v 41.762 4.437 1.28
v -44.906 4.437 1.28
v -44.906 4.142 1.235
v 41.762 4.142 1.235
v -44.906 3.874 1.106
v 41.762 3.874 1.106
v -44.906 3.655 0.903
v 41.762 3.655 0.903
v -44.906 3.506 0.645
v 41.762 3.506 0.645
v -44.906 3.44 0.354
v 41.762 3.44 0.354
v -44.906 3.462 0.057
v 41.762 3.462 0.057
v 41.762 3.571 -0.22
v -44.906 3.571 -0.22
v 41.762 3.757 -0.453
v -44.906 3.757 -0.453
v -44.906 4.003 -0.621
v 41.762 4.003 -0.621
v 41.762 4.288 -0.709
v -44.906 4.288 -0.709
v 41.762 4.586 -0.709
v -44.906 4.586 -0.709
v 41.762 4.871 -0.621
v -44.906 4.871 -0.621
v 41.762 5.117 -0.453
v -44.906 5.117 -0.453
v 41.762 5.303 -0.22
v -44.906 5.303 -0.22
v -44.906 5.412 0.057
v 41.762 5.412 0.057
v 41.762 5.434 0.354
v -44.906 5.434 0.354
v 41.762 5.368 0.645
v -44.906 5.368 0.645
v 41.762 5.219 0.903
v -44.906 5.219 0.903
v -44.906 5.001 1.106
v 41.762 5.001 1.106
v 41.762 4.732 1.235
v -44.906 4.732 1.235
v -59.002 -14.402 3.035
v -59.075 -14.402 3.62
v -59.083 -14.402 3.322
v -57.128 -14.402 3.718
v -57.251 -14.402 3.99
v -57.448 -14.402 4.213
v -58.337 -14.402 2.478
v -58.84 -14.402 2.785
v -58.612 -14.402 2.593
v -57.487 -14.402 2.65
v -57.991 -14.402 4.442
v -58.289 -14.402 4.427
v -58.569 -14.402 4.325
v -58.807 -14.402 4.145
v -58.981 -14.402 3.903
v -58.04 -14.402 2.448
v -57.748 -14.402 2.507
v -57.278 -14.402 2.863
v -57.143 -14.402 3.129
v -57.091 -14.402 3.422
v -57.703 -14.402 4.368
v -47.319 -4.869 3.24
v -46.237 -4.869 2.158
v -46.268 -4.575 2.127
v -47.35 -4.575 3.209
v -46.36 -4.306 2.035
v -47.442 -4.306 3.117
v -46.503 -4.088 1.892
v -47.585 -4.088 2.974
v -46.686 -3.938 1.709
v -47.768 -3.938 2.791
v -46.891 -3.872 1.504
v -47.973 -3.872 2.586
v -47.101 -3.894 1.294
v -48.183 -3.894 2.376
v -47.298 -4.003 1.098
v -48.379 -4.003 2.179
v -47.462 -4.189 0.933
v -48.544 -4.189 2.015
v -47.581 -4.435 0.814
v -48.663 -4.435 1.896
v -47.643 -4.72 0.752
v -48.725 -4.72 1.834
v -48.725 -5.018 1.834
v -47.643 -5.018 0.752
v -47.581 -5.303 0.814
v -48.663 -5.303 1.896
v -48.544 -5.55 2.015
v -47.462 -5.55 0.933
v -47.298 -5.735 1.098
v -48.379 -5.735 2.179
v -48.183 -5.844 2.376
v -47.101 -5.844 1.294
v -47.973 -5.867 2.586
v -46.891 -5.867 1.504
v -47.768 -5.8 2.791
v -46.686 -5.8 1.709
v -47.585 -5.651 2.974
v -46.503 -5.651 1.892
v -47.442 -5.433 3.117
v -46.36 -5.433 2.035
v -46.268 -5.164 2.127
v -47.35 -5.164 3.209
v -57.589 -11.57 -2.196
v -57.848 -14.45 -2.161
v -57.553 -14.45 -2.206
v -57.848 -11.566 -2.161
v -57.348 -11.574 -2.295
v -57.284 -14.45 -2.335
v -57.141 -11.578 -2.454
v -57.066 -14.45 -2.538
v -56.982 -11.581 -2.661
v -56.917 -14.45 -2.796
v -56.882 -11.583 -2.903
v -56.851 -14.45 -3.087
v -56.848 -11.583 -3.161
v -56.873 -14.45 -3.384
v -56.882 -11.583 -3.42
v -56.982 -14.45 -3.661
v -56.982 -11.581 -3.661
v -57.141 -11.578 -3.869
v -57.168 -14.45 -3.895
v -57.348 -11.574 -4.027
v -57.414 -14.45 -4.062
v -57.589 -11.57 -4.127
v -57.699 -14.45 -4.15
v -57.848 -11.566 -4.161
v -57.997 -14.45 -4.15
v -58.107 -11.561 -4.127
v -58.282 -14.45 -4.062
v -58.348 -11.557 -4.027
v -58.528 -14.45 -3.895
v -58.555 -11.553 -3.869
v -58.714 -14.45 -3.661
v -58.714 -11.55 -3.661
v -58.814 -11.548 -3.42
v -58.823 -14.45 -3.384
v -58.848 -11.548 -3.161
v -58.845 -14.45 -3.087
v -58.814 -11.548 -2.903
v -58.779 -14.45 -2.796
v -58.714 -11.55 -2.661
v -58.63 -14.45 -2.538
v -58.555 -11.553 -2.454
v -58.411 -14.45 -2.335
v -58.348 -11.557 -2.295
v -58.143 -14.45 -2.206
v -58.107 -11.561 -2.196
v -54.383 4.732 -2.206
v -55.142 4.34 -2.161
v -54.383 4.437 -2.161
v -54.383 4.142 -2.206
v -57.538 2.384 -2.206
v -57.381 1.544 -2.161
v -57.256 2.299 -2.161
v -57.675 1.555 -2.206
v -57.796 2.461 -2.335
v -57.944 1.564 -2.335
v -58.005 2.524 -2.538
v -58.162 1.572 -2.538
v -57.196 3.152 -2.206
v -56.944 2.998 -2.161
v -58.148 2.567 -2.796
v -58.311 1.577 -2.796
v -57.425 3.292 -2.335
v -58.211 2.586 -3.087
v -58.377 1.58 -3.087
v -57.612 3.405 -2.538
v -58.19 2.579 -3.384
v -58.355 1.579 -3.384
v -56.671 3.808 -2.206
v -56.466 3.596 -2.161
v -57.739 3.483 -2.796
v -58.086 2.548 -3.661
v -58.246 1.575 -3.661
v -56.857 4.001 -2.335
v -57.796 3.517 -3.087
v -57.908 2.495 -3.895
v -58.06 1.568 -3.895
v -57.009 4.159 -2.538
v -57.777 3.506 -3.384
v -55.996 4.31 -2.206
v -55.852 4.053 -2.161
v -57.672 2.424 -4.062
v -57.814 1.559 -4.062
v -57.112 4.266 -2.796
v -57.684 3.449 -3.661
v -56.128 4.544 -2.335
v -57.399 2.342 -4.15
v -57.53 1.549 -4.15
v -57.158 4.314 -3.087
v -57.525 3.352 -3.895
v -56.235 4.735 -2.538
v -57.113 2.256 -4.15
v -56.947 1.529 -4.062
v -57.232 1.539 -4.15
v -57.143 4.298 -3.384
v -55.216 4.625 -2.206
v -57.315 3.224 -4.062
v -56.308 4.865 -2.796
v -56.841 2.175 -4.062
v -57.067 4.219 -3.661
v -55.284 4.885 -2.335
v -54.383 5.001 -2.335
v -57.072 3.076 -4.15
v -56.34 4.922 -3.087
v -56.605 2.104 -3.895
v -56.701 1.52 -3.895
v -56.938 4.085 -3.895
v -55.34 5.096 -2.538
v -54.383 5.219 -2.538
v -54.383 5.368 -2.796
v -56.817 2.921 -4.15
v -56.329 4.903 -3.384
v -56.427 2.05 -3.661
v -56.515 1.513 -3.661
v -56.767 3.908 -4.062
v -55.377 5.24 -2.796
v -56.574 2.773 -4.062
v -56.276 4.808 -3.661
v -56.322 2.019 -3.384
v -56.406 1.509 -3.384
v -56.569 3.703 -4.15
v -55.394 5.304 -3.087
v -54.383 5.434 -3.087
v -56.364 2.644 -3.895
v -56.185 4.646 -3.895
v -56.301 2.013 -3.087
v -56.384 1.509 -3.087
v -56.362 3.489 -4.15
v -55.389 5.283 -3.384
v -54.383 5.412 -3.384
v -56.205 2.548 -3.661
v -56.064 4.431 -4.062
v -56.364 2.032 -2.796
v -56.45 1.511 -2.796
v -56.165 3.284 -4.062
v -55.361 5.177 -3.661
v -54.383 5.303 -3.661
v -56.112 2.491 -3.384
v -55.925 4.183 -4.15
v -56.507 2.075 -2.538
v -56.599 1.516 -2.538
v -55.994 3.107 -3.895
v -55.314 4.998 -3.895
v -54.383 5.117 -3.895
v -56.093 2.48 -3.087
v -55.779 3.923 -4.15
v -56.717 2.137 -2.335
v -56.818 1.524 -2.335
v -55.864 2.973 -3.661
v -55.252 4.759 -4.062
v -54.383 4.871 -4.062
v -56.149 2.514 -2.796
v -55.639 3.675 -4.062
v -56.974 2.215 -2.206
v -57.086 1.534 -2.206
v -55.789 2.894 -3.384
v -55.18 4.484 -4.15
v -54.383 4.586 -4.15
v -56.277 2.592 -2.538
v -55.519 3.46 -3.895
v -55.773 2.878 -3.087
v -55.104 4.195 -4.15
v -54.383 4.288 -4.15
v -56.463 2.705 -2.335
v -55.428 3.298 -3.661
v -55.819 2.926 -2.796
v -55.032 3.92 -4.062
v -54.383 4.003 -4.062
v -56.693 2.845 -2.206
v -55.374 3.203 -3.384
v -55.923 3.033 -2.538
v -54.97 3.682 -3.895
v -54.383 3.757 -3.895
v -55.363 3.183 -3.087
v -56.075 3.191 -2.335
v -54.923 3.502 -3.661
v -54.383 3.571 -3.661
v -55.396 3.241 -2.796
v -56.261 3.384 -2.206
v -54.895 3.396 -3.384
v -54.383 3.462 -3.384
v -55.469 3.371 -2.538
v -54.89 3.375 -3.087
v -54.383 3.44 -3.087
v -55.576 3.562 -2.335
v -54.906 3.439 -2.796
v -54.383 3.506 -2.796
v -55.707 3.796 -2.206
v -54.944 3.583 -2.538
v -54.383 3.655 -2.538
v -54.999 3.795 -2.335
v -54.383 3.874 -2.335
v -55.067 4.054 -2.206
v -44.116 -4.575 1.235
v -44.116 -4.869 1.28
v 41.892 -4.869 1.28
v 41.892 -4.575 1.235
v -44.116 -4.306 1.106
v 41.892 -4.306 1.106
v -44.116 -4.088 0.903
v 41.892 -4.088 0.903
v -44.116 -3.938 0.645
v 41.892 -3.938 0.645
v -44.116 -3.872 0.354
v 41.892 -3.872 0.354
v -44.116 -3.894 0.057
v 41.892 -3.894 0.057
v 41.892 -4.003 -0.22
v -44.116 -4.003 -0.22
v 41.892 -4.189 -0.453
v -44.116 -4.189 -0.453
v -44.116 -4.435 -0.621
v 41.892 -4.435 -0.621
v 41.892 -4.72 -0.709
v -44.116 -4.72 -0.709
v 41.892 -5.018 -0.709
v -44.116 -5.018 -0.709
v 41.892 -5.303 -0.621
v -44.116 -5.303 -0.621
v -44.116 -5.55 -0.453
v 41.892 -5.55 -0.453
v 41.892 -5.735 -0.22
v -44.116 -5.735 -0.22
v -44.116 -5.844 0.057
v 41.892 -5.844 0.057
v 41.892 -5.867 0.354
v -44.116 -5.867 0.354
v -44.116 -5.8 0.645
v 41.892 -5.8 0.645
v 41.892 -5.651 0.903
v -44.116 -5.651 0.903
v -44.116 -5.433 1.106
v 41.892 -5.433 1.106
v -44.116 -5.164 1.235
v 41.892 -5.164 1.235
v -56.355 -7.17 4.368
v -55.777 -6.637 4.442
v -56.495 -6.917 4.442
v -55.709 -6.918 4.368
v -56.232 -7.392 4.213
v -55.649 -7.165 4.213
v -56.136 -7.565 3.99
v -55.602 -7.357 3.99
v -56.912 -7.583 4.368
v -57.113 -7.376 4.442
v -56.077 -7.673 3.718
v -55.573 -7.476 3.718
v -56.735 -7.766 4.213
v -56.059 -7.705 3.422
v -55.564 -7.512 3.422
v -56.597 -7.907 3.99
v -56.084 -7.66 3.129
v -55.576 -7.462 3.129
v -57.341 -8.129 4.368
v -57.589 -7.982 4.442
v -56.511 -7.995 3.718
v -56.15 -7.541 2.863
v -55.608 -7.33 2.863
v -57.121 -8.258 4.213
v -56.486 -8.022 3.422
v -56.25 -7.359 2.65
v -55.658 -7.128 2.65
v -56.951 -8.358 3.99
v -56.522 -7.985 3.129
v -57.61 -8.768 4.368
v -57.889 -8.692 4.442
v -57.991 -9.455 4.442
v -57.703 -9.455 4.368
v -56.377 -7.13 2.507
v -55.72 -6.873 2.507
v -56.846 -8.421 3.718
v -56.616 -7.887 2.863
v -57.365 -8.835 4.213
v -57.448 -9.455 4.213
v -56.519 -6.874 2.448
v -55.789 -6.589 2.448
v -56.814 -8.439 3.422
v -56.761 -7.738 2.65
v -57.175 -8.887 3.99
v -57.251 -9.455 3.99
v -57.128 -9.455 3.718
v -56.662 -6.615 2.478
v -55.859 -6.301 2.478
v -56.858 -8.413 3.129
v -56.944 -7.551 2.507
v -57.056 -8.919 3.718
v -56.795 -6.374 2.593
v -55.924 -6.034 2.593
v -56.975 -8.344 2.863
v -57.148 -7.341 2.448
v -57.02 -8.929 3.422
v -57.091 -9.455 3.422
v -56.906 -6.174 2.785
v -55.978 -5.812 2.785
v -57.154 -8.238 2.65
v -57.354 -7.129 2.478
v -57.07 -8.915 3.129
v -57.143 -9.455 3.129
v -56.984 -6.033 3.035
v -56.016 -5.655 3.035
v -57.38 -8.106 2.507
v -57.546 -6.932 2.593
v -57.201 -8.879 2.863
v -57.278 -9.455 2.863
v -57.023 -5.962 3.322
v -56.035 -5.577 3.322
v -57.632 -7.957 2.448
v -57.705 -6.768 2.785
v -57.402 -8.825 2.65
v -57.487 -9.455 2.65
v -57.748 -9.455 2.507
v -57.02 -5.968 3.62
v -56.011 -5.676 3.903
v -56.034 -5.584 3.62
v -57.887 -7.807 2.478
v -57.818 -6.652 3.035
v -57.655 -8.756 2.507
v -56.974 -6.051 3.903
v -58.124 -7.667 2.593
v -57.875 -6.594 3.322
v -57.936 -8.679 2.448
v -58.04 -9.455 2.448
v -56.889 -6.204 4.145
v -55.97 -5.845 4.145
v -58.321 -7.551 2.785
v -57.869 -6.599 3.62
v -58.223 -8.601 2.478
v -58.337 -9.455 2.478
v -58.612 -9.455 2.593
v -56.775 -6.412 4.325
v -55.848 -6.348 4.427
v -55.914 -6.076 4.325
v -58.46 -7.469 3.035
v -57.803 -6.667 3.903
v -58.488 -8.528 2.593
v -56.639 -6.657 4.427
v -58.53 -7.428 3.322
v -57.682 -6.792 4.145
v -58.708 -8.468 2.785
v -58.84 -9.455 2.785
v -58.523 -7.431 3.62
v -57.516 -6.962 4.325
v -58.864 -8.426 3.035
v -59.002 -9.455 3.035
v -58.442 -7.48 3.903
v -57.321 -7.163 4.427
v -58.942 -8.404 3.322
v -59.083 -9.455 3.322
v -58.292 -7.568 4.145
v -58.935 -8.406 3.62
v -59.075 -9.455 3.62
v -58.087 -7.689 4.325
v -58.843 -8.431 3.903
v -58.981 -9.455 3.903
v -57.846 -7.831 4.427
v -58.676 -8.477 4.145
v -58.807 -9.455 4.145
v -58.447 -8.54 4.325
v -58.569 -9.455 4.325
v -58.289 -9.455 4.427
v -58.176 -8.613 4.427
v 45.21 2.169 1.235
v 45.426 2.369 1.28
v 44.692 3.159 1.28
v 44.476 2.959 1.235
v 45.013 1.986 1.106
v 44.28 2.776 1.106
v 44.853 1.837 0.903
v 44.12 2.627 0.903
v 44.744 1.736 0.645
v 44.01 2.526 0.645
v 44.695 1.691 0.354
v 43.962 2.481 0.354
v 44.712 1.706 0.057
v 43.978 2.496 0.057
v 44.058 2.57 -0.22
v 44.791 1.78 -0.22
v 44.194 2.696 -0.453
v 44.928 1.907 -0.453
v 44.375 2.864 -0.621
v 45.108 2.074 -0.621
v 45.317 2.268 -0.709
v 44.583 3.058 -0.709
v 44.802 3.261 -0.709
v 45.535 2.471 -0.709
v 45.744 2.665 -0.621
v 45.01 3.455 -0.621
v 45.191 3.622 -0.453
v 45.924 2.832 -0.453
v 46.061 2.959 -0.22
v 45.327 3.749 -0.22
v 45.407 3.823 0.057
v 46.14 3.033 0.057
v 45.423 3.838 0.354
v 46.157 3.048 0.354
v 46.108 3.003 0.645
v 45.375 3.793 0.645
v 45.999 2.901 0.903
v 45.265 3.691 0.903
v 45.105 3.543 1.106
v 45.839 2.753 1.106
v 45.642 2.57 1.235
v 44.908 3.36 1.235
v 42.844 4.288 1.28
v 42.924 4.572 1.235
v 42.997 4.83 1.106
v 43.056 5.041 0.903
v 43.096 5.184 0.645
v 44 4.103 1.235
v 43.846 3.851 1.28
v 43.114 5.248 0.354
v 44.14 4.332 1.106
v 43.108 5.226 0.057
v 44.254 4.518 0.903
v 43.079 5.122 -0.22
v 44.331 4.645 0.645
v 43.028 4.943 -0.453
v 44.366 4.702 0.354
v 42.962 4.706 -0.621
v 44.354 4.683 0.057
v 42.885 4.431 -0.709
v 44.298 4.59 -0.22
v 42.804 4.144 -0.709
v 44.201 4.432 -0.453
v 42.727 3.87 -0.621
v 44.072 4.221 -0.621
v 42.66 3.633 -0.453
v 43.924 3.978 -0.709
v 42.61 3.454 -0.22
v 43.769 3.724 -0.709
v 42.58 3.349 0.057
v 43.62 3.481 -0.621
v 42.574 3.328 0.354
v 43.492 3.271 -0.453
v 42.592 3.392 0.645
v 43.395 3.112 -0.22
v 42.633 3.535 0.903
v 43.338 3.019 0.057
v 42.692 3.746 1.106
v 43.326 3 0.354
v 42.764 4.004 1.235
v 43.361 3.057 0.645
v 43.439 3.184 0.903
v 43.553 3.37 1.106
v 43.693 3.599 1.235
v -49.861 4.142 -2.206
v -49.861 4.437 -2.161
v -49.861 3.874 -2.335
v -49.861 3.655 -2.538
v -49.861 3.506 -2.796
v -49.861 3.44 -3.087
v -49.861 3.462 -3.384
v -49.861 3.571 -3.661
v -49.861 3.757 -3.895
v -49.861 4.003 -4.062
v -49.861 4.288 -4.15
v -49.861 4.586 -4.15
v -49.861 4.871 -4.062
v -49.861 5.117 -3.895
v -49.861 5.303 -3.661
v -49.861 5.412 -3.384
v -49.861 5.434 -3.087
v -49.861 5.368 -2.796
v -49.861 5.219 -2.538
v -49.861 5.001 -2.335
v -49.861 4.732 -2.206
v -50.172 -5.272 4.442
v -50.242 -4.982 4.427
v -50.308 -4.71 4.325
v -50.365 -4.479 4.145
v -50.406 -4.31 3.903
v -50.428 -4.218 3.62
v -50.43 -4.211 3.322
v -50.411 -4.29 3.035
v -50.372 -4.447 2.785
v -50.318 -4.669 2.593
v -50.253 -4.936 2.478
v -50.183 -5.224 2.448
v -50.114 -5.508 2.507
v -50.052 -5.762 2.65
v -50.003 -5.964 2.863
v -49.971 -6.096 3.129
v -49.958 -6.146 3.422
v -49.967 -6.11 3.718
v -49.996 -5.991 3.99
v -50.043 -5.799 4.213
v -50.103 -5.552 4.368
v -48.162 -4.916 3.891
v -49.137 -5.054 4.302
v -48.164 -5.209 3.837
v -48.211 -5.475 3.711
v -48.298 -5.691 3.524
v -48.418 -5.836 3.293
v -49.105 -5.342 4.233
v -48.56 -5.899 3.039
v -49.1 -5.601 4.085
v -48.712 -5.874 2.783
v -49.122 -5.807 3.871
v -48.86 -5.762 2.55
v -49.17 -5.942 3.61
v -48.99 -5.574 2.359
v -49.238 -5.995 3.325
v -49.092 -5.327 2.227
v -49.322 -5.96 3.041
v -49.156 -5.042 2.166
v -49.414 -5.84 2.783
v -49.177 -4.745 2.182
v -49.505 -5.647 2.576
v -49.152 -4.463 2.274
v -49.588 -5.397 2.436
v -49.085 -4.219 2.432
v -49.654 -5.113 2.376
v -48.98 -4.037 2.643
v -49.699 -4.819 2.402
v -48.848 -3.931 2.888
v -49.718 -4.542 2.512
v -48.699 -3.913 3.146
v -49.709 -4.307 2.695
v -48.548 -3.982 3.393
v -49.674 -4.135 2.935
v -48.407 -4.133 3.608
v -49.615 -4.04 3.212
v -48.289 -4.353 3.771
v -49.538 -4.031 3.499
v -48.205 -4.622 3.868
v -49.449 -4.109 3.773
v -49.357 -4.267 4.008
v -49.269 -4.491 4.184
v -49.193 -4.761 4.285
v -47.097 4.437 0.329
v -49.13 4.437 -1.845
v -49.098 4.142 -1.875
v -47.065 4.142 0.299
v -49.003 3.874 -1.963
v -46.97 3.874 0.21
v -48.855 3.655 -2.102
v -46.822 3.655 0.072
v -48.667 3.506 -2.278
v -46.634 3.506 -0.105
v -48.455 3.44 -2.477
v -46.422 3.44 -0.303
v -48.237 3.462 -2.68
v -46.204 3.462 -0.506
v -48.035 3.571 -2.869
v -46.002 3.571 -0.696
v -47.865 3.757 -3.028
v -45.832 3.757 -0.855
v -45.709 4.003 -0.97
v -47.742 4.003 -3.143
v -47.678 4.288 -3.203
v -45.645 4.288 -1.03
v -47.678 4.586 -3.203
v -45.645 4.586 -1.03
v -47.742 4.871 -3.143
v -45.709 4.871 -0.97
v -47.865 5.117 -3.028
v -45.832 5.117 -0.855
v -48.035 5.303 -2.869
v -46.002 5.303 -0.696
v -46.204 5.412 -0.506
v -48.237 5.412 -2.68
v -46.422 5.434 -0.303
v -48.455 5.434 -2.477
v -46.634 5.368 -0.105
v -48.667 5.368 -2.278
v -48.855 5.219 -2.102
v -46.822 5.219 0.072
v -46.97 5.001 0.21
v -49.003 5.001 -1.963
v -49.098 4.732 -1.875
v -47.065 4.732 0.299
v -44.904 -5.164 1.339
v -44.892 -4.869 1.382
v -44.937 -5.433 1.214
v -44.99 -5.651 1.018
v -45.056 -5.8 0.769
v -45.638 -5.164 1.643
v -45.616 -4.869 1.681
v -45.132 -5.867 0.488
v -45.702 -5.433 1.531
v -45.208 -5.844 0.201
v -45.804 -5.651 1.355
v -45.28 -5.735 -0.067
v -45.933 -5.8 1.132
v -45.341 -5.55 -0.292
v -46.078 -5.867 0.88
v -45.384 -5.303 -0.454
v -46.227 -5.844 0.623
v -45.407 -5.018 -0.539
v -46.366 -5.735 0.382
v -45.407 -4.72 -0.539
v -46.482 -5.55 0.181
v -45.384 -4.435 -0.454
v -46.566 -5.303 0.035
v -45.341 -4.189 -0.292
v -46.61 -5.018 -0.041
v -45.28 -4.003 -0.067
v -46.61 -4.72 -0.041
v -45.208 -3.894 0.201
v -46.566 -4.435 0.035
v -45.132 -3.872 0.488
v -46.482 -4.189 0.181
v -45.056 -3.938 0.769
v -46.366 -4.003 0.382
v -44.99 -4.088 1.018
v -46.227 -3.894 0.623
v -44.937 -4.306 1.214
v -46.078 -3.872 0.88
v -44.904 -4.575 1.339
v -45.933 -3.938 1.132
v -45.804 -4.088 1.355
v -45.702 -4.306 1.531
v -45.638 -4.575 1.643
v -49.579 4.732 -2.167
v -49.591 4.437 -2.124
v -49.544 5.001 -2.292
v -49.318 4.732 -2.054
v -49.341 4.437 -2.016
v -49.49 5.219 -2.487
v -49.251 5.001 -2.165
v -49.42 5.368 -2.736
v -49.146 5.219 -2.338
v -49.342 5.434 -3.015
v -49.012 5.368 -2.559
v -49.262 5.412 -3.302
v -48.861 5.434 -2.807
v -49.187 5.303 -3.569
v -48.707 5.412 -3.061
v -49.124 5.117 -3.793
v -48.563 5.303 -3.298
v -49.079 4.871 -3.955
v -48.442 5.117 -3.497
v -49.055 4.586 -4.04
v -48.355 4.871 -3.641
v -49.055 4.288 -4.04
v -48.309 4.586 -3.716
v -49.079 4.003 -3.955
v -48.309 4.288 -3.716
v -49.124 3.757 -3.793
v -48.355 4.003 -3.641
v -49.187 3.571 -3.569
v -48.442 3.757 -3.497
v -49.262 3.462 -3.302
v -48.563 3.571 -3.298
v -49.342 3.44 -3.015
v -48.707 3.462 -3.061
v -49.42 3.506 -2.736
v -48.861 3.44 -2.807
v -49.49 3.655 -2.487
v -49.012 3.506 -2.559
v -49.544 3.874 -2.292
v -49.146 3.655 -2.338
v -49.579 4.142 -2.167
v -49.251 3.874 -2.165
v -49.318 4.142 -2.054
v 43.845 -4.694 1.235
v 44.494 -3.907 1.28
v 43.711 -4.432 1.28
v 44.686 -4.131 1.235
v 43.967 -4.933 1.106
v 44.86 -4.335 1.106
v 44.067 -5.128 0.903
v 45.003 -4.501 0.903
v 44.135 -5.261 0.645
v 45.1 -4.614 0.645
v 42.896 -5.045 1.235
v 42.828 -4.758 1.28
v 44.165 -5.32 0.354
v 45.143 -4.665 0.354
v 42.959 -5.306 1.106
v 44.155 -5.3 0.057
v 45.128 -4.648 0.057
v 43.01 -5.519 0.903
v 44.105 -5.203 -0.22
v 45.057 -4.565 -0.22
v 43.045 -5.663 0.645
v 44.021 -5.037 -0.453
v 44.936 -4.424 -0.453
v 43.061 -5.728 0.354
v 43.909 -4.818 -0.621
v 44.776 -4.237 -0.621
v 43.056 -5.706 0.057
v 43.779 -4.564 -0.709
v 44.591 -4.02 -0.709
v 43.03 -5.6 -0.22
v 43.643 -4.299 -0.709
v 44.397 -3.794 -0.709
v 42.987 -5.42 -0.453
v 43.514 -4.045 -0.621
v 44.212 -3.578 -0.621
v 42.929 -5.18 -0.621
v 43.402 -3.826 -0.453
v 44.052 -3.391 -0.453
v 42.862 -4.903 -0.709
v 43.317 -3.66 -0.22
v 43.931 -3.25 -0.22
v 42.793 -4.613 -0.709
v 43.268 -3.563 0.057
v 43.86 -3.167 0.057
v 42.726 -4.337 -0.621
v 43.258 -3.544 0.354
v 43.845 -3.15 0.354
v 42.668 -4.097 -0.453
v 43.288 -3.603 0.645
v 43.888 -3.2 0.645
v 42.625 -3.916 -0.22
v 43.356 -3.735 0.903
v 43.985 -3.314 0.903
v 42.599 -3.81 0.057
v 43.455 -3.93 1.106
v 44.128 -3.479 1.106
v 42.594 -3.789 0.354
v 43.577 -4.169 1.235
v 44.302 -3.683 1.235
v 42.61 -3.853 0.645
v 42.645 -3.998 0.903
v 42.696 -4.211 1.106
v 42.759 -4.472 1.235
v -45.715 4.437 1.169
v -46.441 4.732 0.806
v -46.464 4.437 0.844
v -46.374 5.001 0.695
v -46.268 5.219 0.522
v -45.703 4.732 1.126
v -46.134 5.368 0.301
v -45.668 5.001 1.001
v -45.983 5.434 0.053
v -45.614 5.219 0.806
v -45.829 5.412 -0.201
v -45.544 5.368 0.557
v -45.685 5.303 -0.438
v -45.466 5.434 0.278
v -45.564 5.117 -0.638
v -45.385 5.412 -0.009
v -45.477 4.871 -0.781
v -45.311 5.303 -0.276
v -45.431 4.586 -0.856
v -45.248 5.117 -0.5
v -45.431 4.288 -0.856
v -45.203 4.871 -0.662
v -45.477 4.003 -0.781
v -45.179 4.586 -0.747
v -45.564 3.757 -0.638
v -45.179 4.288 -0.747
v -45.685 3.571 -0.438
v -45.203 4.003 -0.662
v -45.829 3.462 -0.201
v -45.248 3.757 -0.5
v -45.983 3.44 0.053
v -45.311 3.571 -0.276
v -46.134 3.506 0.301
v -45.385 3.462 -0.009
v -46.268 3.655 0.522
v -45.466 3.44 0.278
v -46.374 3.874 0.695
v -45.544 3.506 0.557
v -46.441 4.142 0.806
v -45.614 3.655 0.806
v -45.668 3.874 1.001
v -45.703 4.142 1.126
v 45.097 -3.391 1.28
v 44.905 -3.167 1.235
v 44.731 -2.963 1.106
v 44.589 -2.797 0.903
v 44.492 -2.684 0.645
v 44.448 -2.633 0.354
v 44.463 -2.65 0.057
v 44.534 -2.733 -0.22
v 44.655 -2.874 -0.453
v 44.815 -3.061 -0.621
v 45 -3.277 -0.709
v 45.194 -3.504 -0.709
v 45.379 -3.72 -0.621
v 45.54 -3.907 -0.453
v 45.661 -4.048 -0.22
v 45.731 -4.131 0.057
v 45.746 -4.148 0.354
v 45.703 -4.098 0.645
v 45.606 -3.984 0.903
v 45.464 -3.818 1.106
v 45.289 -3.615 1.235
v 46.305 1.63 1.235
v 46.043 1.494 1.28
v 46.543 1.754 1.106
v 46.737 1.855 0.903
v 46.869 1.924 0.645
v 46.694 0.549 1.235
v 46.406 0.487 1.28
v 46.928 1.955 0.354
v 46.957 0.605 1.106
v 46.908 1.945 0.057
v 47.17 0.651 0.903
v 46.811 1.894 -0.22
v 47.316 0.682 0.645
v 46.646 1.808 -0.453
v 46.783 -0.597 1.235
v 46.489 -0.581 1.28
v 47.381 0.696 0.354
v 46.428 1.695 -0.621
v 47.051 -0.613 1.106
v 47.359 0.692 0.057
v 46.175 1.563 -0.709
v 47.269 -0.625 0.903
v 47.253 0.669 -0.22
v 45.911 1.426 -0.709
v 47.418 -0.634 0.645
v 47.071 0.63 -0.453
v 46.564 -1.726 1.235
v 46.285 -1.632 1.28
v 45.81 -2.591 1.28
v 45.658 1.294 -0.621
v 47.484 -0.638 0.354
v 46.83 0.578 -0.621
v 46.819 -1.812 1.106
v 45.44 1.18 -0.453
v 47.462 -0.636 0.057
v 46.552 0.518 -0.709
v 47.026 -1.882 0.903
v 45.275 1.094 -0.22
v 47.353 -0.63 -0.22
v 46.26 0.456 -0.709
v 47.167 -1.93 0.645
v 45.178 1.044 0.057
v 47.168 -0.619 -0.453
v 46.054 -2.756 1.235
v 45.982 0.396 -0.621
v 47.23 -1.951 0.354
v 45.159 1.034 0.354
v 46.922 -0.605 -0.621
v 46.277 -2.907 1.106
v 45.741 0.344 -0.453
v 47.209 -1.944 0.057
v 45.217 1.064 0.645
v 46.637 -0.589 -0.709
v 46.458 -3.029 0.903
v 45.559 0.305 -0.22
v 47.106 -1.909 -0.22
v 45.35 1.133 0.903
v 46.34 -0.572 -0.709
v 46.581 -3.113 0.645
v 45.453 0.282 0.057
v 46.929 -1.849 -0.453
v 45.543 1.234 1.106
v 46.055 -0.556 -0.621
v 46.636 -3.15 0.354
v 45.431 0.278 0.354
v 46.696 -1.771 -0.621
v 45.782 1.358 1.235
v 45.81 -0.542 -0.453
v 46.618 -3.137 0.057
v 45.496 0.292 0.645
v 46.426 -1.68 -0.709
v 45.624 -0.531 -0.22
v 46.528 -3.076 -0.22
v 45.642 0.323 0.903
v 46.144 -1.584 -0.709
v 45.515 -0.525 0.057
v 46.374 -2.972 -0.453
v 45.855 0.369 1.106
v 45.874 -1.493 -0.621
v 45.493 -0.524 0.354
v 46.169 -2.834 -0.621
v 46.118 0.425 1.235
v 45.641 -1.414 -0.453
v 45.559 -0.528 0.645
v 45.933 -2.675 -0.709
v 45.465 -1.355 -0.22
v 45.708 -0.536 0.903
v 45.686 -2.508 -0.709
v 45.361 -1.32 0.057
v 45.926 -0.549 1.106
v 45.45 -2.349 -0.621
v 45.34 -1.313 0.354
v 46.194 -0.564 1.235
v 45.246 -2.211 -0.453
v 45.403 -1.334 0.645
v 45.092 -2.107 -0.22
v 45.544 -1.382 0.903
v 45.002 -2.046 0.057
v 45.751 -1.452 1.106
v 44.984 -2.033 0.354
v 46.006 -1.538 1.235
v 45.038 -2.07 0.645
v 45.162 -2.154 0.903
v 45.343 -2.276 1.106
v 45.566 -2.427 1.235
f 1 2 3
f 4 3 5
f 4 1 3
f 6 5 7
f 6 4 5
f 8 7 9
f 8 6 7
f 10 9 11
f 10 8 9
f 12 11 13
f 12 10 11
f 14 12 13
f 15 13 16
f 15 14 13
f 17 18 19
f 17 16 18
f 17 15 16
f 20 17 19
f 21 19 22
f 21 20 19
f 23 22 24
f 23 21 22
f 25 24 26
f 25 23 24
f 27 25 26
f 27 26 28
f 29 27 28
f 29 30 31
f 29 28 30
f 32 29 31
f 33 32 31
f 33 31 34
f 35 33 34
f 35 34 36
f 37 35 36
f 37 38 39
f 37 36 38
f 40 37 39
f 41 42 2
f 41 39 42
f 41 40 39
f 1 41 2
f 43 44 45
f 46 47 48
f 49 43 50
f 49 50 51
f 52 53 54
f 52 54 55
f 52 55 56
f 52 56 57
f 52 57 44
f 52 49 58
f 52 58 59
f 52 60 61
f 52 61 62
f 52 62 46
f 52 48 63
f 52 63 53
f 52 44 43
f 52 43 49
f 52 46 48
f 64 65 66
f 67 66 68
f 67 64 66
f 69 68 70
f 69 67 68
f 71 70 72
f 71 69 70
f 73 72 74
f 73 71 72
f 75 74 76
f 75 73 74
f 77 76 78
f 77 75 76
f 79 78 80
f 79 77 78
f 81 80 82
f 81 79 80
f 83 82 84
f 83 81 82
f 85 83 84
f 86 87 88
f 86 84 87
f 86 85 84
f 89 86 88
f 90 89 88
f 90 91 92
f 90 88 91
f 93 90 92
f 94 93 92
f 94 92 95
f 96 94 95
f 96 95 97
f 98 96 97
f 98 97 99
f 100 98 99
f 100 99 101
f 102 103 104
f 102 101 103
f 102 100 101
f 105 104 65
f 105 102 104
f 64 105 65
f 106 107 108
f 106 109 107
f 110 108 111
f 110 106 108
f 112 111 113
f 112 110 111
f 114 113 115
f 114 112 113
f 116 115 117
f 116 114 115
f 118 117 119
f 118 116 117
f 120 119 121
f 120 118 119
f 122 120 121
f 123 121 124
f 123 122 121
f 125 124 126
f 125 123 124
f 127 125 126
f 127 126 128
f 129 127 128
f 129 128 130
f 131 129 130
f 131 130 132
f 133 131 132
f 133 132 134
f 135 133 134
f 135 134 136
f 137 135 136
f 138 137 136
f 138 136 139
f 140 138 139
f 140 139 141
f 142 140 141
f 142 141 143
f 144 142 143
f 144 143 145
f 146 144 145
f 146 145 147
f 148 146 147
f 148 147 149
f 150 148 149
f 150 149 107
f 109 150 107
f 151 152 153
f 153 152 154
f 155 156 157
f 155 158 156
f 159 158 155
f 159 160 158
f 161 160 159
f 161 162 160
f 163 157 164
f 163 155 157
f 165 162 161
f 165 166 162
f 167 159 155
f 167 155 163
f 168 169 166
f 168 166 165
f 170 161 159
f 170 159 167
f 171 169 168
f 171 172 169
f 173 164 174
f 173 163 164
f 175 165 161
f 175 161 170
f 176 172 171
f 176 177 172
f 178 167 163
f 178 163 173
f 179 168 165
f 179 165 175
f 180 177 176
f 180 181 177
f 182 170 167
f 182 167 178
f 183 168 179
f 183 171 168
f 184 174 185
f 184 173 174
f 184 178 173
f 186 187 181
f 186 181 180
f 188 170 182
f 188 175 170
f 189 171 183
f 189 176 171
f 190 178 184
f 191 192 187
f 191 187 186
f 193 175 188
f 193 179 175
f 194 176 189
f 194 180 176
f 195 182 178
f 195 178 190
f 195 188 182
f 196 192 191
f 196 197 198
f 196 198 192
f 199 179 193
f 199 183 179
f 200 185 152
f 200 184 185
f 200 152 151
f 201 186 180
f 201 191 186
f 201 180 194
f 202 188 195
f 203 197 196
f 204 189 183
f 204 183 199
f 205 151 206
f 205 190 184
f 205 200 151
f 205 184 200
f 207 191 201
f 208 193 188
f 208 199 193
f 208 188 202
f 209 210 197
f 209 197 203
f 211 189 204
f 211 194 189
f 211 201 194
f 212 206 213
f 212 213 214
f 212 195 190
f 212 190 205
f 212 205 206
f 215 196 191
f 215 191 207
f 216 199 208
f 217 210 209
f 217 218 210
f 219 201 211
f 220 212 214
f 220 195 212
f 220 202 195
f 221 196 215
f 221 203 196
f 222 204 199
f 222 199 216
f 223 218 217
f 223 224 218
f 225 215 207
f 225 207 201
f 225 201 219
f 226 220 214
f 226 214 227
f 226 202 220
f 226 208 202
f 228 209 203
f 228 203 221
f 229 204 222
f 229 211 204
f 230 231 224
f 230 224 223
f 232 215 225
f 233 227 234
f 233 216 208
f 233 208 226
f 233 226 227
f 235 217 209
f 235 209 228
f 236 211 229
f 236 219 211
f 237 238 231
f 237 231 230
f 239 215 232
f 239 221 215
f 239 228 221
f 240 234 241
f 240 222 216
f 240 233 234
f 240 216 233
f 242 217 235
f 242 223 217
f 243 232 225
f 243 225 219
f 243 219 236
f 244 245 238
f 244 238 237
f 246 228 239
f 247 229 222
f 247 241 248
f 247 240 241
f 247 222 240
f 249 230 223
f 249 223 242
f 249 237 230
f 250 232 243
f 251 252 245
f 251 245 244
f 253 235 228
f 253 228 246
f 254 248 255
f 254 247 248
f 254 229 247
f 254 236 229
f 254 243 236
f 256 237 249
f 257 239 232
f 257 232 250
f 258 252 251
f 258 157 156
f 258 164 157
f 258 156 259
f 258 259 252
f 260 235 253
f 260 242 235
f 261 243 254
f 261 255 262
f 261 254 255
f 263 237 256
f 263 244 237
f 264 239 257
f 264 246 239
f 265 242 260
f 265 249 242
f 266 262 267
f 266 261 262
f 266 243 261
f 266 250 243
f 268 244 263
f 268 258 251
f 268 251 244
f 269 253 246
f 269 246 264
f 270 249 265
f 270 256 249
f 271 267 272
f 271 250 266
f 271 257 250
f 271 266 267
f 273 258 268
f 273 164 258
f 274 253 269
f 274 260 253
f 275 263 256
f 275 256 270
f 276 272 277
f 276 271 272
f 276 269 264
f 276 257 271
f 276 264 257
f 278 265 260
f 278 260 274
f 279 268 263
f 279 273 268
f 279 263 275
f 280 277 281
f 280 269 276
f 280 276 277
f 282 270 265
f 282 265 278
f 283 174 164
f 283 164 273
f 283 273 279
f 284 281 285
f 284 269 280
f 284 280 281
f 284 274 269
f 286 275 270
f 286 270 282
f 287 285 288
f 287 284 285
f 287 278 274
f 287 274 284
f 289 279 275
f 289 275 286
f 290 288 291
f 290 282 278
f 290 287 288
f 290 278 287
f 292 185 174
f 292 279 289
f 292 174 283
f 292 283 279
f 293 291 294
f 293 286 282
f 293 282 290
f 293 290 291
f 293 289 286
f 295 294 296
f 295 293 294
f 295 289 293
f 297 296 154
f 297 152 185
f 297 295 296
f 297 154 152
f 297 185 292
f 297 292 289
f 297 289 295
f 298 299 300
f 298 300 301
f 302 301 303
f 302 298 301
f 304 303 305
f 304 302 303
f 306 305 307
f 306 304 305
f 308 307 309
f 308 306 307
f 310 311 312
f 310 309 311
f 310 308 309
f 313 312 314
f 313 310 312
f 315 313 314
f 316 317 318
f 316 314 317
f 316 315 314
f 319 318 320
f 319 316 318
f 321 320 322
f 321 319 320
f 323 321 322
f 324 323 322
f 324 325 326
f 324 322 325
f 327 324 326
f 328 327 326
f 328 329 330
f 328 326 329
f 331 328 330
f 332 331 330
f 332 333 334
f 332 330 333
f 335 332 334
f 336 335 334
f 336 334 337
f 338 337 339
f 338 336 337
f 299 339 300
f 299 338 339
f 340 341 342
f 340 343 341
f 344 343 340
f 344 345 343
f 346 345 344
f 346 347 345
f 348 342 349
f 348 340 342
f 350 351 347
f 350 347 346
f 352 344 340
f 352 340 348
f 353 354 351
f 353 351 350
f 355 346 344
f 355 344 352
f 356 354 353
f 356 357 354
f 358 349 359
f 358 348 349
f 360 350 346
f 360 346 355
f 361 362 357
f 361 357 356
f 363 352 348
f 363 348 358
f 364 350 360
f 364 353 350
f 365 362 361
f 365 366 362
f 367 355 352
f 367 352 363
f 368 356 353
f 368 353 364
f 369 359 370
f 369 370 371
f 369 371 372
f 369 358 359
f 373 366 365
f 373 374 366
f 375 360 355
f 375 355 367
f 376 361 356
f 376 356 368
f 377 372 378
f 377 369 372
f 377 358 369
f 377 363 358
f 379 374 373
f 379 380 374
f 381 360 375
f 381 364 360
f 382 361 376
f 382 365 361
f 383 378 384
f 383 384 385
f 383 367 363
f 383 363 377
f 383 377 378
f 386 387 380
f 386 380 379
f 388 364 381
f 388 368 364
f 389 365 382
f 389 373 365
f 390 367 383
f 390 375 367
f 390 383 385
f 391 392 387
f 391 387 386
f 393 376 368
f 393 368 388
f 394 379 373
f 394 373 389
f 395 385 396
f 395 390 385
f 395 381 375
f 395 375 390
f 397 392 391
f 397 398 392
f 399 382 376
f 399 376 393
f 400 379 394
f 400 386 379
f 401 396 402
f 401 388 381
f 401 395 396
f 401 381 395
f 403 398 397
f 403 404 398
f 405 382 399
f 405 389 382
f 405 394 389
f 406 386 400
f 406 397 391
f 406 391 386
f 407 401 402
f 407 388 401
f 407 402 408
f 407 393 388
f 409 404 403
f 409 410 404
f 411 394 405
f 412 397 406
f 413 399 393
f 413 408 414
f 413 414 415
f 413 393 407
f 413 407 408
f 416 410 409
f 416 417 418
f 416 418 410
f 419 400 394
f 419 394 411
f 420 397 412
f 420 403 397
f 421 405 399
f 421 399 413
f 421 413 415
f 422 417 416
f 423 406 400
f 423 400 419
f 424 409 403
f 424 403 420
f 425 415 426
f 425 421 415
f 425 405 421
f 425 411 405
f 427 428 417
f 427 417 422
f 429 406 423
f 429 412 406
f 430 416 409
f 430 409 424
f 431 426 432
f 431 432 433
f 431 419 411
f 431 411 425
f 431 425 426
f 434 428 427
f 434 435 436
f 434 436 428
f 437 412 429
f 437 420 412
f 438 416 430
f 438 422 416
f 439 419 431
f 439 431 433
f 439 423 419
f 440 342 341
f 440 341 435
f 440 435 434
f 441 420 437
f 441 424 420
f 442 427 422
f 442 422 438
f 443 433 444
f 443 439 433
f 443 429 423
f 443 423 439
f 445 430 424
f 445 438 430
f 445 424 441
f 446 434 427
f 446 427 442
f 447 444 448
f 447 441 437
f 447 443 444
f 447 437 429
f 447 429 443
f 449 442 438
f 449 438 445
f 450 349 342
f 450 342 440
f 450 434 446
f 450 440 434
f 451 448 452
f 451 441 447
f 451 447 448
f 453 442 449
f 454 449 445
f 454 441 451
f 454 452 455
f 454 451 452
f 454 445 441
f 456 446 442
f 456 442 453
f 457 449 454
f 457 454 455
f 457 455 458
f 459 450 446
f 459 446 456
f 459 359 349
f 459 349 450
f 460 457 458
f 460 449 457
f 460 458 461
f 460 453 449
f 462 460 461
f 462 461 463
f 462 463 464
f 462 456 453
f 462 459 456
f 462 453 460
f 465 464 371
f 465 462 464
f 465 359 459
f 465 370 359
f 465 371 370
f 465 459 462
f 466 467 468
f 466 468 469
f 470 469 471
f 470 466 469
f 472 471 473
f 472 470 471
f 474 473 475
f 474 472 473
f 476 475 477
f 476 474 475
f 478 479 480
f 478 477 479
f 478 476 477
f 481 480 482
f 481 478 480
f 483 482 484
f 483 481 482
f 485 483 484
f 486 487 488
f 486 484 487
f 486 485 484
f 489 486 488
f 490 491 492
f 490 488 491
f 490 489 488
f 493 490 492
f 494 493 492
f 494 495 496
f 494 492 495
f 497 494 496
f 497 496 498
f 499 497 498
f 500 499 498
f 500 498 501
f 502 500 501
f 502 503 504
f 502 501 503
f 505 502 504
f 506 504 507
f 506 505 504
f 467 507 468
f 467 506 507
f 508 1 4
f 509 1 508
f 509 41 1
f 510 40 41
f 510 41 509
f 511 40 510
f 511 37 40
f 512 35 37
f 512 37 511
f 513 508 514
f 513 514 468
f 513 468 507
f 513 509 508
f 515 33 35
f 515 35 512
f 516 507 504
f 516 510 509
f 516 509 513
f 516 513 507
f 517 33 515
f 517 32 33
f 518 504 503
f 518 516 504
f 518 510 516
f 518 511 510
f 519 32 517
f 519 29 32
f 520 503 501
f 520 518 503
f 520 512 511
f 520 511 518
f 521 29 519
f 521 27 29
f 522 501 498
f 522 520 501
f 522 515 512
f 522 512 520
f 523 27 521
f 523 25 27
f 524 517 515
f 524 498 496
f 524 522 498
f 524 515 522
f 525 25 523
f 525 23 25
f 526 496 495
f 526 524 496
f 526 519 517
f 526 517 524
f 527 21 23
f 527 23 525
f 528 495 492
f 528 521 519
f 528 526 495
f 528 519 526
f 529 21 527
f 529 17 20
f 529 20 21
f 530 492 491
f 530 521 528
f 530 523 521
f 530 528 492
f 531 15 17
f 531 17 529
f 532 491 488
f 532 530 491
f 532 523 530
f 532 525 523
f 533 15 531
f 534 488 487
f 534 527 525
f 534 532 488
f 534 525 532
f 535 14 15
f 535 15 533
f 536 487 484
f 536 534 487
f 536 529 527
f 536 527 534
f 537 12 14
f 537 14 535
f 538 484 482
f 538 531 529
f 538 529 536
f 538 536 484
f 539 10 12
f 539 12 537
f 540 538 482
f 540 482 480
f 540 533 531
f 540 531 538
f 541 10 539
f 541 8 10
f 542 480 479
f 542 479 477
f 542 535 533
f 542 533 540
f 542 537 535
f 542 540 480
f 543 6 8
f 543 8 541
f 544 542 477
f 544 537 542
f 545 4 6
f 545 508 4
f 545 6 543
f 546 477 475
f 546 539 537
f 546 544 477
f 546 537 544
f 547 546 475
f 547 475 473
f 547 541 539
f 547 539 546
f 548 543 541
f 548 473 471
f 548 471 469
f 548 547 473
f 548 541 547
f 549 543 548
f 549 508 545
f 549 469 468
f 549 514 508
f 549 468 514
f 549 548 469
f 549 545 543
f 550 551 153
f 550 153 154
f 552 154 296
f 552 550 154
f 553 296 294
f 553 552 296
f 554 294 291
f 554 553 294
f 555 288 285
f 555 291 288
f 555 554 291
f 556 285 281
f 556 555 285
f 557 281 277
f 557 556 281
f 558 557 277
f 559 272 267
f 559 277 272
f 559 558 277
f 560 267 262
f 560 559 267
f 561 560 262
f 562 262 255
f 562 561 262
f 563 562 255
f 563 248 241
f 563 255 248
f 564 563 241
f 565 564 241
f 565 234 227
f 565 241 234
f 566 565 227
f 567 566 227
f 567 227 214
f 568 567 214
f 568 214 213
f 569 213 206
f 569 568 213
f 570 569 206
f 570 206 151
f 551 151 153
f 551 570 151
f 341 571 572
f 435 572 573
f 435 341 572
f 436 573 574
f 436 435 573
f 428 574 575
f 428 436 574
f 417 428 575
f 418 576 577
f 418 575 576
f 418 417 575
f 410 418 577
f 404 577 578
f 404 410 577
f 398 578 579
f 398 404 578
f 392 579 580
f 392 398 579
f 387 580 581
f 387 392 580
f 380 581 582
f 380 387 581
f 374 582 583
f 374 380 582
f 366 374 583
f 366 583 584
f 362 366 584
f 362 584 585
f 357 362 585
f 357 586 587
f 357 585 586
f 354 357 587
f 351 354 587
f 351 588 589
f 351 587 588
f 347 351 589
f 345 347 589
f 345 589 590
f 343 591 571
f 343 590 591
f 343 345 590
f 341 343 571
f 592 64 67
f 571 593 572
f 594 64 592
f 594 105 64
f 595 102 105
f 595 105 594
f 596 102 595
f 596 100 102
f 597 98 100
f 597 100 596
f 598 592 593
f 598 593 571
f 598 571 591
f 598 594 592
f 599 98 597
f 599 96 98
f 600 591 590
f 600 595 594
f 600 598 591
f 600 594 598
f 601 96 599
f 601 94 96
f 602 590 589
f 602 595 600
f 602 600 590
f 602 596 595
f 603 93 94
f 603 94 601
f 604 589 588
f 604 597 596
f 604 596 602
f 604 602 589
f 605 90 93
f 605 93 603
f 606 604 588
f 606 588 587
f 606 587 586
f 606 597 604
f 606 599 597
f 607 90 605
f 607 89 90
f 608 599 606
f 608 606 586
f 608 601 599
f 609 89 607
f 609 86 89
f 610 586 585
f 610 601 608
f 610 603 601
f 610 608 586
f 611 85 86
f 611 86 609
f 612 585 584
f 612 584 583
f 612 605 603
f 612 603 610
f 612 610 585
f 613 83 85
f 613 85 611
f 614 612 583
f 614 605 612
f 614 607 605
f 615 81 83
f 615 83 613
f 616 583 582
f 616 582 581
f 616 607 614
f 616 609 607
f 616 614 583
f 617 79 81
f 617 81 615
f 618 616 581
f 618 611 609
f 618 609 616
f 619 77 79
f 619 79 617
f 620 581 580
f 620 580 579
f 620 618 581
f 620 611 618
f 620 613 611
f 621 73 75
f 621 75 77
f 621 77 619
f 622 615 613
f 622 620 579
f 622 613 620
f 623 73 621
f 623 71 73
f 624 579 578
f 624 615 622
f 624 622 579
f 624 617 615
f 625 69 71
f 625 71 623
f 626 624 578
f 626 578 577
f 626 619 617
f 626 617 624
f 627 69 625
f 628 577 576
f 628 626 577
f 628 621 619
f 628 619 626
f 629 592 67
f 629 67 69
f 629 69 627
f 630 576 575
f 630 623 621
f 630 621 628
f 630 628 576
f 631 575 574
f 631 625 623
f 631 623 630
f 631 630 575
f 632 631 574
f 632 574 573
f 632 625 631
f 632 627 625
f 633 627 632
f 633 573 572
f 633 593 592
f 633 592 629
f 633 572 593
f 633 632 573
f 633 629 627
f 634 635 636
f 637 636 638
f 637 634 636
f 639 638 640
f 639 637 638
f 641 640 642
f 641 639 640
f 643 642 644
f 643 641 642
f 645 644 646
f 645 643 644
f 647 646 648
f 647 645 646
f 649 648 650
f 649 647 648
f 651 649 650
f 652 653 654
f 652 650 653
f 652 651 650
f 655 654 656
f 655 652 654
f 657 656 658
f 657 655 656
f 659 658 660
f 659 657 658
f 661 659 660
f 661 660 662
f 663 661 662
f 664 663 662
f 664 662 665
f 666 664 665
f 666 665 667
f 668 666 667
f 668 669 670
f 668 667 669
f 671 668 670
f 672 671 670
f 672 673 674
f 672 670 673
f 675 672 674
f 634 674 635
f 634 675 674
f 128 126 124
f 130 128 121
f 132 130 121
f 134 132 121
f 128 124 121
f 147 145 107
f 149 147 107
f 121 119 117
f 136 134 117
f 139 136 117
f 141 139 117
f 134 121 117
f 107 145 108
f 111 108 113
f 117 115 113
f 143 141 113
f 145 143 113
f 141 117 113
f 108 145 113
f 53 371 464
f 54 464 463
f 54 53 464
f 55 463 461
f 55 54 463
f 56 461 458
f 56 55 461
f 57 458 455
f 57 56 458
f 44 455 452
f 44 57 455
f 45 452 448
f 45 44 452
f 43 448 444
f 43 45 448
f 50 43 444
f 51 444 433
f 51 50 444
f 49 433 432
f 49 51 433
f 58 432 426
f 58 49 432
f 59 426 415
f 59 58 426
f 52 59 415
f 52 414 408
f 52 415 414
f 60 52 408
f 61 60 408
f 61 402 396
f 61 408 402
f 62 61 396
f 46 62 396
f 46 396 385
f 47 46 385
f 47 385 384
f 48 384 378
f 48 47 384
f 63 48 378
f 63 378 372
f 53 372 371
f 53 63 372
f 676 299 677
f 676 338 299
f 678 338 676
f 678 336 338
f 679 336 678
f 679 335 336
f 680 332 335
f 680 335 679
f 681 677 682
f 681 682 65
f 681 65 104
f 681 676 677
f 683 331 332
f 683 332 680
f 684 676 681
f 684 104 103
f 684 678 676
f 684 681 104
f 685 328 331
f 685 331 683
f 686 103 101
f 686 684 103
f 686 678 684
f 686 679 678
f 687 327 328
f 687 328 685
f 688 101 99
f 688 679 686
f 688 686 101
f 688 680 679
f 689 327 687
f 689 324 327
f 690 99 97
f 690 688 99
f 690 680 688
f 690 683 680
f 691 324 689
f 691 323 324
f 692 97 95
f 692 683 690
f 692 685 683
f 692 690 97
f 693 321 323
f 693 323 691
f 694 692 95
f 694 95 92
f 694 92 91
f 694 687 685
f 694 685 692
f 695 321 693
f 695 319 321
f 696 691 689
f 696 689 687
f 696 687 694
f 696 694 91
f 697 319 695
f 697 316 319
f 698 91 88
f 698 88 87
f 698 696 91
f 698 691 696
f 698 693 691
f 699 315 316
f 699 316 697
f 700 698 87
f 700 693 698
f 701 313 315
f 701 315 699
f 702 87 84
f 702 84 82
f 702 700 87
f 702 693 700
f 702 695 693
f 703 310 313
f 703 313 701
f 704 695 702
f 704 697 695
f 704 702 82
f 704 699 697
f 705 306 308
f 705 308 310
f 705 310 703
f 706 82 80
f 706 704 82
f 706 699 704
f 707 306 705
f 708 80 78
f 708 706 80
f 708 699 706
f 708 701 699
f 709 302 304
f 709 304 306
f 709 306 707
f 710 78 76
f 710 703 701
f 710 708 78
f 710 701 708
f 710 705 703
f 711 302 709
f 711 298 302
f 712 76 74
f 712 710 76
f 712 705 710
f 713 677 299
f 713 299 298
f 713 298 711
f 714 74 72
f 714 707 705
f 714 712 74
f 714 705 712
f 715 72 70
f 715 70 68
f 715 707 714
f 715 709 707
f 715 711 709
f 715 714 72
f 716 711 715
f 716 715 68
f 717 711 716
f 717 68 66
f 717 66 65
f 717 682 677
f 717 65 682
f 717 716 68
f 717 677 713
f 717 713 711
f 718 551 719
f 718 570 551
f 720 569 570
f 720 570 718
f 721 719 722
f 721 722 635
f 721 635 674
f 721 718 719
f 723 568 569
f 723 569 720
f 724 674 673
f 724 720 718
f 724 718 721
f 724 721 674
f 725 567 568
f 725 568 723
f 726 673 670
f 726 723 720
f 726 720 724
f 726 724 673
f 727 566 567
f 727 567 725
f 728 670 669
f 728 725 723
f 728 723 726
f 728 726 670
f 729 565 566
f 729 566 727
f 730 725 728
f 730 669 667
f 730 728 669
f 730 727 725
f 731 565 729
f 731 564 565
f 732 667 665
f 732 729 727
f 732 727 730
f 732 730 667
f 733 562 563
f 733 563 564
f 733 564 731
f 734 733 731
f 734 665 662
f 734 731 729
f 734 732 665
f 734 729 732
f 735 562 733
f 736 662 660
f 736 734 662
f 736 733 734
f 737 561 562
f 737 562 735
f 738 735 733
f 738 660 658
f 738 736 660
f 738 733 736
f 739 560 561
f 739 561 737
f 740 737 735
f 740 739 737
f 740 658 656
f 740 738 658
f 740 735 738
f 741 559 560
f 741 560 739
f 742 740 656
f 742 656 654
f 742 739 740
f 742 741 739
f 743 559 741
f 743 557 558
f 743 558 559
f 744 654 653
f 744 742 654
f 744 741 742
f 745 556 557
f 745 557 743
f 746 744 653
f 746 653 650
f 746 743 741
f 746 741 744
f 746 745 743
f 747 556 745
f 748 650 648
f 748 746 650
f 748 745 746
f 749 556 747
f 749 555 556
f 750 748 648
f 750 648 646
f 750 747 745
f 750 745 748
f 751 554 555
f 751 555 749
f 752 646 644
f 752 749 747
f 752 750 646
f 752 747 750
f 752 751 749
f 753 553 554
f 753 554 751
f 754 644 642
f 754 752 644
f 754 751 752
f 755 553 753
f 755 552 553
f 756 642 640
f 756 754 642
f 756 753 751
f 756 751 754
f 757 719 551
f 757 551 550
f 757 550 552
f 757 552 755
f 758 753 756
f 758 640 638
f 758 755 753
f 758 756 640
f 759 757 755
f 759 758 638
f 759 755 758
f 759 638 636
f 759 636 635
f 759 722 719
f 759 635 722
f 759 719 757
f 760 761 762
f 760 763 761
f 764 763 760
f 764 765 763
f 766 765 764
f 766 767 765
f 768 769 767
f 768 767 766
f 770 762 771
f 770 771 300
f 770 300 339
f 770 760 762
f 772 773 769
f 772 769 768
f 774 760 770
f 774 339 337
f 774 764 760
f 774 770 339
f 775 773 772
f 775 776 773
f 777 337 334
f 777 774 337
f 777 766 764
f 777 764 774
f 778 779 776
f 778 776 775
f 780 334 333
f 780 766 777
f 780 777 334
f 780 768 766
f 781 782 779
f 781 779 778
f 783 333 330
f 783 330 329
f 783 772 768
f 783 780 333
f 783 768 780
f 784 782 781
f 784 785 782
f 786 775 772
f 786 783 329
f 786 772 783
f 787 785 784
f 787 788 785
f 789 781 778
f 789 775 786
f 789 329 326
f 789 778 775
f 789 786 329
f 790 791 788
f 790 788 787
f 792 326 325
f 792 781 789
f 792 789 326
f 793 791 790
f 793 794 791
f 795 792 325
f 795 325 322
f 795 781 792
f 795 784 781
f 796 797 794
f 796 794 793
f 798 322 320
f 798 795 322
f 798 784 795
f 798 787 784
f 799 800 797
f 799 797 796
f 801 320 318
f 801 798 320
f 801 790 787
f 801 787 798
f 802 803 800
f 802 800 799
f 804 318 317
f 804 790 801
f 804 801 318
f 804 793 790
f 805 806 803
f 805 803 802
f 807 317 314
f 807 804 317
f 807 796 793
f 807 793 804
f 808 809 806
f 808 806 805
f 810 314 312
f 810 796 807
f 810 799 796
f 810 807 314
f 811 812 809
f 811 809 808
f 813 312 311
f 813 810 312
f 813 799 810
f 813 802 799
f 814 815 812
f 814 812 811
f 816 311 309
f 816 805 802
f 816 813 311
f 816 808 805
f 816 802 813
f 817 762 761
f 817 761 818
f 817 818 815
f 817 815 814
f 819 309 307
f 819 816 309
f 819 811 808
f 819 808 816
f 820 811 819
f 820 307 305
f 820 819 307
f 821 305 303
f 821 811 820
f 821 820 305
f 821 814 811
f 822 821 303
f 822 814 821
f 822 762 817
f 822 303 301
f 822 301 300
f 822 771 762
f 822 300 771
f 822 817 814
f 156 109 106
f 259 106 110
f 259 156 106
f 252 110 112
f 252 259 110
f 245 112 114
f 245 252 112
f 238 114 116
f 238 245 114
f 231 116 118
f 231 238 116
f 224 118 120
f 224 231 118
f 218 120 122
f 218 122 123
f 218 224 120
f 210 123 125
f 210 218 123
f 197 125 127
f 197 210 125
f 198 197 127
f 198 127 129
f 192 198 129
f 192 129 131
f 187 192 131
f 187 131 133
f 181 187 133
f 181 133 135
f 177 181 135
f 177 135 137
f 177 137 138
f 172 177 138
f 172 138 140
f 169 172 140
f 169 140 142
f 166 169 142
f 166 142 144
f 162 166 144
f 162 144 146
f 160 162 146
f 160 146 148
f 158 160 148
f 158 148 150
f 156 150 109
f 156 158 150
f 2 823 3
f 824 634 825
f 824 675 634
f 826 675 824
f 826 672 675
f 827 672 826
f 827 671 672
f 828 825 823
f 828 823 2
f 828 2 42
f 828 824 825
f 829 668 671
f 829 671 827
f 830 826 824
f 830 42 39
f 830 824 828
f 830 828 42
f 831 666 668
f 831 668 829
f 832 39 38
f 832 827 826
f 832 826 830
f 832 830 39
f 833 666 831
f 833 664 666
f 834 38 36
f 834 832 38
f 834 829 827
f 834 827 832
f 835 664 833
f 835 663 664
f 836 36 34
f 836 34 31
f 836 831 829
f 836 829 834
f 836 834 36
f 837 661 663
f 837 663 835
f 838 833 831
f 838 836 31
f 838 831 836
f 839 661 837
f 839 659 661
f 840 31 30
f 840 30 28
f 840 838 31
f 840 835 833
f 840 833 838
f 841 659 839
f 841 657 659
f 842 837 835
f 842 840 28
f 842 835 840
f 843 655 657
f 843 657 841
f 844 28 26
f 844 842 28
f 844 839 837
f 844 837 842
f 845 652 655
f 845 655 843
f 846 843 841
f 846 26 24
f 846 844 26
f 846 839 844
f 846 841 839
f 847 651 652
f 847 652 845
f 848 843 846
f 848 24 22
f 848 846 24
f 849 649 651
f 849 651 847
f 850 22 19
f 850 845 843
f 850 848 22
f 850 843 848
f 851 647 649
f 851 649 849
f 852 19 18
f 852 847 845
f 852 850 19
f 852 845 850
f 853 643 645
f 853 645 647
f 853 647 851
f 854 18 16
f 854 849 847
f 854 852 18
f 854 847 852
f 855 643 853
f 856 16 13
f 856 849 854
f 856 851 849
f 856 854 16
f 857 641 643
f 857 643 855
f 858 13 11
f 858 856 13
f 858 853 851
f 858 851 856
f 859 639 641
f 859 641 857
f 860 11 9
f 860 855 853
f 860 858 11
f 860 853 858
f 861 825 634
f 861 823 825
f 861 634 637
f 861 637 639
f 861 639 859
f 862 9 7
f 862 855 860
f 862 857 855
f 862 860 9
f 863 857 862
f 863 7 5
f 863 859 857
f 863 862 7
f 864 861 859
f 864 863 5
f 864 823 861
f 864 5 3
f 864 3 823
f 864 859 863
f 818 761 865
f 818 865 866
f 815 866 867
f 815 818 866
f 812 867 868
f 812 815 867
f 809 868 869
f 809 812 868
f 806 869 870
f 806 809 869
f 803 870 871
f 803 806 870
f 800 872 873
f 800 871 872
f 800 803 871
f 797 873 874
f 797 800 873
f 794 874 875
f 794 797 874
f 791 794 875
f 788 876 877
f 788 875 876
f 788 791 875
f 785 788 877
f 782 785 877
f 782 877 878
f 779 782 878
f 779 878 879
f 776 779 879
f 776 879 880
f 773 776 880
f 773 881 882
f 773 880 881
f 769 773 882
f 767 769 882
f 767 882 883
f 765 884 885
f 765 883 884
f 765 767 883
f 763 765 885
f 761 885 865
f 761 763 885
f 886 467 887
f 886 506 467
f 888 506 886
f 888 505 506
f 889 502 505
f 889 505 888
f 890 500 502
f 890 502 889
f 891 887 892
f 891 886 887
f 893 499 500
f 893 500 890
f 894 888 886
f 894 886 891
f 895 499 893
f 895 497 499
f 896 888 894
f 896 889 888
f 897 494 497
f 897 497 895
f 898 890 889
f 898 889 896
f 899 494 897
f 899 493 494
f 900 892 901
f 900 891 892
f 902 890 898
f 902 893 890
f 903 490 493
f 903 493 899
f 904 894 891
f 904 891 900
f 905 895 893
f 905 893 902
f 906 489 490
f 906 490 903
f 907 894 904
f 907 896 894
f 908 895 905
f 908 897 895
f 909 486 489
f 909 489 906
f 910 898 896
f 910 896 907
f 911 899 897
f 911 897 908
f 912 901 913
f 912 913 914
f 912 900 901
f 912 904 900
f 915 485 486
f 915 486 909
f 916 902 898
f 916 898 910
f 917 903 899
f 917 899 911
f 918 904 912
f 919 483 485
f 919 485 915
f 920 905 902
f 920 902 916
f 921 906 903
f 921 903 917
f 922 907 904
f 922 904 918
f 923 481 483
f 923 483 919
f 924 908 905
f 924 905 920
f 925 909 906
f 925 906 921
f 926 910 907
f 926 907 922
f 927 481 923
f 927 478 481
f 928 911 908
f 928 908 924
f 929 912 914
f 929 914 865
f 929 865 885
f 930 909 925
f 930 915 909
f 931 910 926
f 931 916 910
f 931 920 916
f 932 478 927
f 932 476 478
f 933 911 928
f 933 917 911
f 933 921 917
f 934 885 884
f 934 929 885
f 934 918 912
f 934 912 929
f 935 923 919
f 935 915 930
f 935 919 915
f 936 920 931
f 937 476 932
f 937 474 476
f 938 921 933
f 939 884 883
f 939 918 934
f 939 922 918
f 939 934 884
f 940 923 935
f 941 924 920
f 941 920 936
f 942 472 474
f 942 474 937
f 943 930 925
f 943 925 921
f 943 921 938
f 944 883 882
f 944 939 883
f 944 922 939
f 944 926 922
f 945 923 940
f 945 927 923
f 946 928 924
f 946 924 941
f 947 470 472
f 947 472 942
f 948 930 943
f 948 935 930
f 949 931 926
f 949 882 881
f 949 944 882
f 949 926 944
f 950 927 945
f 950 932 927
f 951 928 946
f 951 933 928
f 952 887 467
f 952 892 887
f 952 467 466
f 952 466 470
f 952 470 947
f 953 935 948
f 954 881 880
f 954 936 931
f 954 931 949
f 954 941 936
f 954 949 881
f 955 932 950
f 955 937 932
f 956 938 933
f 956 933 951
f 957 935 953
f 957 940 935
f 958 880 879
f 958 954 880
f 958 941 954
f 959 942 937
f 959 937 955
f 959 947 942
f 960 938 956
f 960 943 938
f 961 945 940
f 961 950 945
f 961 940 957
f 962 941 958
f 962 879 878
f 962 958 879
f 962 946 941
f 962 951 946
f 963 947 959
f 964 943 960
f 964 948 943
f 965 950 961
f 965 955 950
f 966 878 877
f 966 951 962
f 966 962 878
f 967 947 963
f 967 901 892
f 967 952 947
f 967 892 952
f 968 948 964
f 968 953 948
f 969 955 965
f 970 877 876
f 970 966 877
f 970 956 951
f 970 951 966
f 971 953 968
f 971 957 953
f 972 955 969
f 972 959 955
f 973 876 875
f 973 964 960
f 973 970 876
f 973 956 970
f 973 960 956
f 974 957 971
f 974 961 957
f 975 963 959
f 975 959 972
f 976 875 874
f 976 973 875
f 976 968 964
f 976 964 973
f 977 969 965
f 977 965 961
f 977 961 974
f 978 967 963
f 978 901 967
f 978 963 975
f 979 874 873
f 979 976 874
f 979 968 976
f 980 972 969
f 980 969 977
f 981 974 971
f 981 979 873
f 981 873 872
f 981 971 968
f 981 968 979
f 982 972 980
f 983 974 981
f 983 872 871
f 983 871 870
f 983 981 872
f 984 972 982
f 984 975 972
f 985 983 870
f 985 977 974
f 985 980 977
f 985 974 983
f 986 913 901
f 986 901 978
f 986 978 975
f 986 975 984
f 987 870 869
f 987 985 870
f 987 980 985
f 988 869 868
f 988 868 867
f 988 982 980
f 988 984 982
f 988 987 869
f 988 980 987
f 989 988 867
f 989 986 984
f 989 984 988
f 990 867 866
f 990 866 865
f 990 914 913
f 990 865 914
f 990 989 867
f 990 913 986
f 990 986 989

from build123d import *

# Parameters (mm, degrees)
SWEEP1_PROFILE_R = 1


with BuildPart() as part:
    # Sweep1: sweep along a curve in space
    with BuildLine() as sweep1_path:
        Line((-58.090612369, -10.590919014, 3.446712504), (-58.090612369, -14.401731911, 3.446712504))
        Line((-58.090612369, -9.4553548, 3.446712504), (-58.090612369, -10.590919014, 3.446712504))
        ThreePointArc((-58.090612369, -9.4553548, 3.446712504), (-57.449636999, -7.601978747, 3.446712504), (-55.800610506, -6.540581628, 3.446712504))
        Line((-50.195074801, -5.175151224, 3.446712504), (-55.800610506, -6.540581628, 3.446712504))
        ThreePointArc((-48.025907275, -4.86933782, 2.533008422), (-49.028684136, -4.949042, 3.208573711), (-50.195074801, -5.175151224, 3.446712504))
        Line((-48.025907275, -4.86933782, 2.533008422), (-46.944041505, -4.86933782, 1.451142652))
        ThreePointArc((-46.944041505, -4.86933782, 1.451142652), (-45.646348109, -4.86933782, 0.584051647), (-44.11561438, -4.86933782, 0.279569777))
        Line((-44.11561438, -4.86933782, 0.279569777), (41.891910563, -4.86933782, 0.279569777))
        ThreePointArc((41.891910563, -4.86933782, 0.279569777), (43.279021203, -4.621127269, 0.279569777), (44.493984095, -3.907299856, 0.279569777))
        Line((44.493984095, -3.907299856, 0.279569777), (45.097196657, -3.390636572, 0.279569777))
        ThreePointArc((45.097196657, -3.390636572, 0.279569777), (46.488619757, -0.580675967, 0.279569777), (45.42605494, 2.369390618, 0.279569777))
        Line((45.42605494, 2.369390618, 0.279569777), (44.692451893, 3.159283727, 0.279569777))
        ThreePointArc((41.761520079, 4.437218573, 0.279569777), (43.360228837, 4.103842403, 0.279569777), (44.692451893, 3.159283727, 0.279569777))
        Line((41.761520079, 4.437218573, 0.279569777), (-44.906338407, 4.437218573, 0.279569777))
        ThreePointArc((-44.906338407, 4.437218573, 0.279569777), (-45.702437865, 4.437218573, 0.114297455), (-46.366964117, 4.437218573, -0.35420457))
        Line((-46.366964117, 4.437218573, -0.35420457), (-48.399983368, 4.437218573, -2.527696321))
        ThreePointArc((-49.860609078, 4.437218573, -3.161470668), (-49.06450962, 4.437218573, -2.996198346), (-48.399983368, 4.437218573, -2.527696321))
        Line((-49.860609078, 4.437218573, -3.161470668), (-54.382636754, 4.437218573, -3.161470668))
        ThreePointArc((-57.380734796, 1.544027447, -3.161470668), (-56.465852223, 3.595971294, -3.161470668), (-54.382636754, 4.437218573, -3.161470668))
        Line((-57.380734796, 1.544027447, -3.161470668), (-57.847768858, -11.56550035, -3.161470668))
        Line((-57.847768858, -11.56550035, -3.161470668), (-57.847768858, -14.450426845, -3.161470668))
    # Sweep1 profile (on start of the path) → Sweep1 (sweep)
    with BuildSketch(Plane(origin=(-57.847768858, -14.450426845, -3.161470668), x_dir=(0, 0, 1), z_dir=(0, 1, 0))):
        Circle(SWEEP1_PROFILE_R)
    sweep(path=sweep1_path.line, transition=Transition.RIGHT)


solid = part.part
